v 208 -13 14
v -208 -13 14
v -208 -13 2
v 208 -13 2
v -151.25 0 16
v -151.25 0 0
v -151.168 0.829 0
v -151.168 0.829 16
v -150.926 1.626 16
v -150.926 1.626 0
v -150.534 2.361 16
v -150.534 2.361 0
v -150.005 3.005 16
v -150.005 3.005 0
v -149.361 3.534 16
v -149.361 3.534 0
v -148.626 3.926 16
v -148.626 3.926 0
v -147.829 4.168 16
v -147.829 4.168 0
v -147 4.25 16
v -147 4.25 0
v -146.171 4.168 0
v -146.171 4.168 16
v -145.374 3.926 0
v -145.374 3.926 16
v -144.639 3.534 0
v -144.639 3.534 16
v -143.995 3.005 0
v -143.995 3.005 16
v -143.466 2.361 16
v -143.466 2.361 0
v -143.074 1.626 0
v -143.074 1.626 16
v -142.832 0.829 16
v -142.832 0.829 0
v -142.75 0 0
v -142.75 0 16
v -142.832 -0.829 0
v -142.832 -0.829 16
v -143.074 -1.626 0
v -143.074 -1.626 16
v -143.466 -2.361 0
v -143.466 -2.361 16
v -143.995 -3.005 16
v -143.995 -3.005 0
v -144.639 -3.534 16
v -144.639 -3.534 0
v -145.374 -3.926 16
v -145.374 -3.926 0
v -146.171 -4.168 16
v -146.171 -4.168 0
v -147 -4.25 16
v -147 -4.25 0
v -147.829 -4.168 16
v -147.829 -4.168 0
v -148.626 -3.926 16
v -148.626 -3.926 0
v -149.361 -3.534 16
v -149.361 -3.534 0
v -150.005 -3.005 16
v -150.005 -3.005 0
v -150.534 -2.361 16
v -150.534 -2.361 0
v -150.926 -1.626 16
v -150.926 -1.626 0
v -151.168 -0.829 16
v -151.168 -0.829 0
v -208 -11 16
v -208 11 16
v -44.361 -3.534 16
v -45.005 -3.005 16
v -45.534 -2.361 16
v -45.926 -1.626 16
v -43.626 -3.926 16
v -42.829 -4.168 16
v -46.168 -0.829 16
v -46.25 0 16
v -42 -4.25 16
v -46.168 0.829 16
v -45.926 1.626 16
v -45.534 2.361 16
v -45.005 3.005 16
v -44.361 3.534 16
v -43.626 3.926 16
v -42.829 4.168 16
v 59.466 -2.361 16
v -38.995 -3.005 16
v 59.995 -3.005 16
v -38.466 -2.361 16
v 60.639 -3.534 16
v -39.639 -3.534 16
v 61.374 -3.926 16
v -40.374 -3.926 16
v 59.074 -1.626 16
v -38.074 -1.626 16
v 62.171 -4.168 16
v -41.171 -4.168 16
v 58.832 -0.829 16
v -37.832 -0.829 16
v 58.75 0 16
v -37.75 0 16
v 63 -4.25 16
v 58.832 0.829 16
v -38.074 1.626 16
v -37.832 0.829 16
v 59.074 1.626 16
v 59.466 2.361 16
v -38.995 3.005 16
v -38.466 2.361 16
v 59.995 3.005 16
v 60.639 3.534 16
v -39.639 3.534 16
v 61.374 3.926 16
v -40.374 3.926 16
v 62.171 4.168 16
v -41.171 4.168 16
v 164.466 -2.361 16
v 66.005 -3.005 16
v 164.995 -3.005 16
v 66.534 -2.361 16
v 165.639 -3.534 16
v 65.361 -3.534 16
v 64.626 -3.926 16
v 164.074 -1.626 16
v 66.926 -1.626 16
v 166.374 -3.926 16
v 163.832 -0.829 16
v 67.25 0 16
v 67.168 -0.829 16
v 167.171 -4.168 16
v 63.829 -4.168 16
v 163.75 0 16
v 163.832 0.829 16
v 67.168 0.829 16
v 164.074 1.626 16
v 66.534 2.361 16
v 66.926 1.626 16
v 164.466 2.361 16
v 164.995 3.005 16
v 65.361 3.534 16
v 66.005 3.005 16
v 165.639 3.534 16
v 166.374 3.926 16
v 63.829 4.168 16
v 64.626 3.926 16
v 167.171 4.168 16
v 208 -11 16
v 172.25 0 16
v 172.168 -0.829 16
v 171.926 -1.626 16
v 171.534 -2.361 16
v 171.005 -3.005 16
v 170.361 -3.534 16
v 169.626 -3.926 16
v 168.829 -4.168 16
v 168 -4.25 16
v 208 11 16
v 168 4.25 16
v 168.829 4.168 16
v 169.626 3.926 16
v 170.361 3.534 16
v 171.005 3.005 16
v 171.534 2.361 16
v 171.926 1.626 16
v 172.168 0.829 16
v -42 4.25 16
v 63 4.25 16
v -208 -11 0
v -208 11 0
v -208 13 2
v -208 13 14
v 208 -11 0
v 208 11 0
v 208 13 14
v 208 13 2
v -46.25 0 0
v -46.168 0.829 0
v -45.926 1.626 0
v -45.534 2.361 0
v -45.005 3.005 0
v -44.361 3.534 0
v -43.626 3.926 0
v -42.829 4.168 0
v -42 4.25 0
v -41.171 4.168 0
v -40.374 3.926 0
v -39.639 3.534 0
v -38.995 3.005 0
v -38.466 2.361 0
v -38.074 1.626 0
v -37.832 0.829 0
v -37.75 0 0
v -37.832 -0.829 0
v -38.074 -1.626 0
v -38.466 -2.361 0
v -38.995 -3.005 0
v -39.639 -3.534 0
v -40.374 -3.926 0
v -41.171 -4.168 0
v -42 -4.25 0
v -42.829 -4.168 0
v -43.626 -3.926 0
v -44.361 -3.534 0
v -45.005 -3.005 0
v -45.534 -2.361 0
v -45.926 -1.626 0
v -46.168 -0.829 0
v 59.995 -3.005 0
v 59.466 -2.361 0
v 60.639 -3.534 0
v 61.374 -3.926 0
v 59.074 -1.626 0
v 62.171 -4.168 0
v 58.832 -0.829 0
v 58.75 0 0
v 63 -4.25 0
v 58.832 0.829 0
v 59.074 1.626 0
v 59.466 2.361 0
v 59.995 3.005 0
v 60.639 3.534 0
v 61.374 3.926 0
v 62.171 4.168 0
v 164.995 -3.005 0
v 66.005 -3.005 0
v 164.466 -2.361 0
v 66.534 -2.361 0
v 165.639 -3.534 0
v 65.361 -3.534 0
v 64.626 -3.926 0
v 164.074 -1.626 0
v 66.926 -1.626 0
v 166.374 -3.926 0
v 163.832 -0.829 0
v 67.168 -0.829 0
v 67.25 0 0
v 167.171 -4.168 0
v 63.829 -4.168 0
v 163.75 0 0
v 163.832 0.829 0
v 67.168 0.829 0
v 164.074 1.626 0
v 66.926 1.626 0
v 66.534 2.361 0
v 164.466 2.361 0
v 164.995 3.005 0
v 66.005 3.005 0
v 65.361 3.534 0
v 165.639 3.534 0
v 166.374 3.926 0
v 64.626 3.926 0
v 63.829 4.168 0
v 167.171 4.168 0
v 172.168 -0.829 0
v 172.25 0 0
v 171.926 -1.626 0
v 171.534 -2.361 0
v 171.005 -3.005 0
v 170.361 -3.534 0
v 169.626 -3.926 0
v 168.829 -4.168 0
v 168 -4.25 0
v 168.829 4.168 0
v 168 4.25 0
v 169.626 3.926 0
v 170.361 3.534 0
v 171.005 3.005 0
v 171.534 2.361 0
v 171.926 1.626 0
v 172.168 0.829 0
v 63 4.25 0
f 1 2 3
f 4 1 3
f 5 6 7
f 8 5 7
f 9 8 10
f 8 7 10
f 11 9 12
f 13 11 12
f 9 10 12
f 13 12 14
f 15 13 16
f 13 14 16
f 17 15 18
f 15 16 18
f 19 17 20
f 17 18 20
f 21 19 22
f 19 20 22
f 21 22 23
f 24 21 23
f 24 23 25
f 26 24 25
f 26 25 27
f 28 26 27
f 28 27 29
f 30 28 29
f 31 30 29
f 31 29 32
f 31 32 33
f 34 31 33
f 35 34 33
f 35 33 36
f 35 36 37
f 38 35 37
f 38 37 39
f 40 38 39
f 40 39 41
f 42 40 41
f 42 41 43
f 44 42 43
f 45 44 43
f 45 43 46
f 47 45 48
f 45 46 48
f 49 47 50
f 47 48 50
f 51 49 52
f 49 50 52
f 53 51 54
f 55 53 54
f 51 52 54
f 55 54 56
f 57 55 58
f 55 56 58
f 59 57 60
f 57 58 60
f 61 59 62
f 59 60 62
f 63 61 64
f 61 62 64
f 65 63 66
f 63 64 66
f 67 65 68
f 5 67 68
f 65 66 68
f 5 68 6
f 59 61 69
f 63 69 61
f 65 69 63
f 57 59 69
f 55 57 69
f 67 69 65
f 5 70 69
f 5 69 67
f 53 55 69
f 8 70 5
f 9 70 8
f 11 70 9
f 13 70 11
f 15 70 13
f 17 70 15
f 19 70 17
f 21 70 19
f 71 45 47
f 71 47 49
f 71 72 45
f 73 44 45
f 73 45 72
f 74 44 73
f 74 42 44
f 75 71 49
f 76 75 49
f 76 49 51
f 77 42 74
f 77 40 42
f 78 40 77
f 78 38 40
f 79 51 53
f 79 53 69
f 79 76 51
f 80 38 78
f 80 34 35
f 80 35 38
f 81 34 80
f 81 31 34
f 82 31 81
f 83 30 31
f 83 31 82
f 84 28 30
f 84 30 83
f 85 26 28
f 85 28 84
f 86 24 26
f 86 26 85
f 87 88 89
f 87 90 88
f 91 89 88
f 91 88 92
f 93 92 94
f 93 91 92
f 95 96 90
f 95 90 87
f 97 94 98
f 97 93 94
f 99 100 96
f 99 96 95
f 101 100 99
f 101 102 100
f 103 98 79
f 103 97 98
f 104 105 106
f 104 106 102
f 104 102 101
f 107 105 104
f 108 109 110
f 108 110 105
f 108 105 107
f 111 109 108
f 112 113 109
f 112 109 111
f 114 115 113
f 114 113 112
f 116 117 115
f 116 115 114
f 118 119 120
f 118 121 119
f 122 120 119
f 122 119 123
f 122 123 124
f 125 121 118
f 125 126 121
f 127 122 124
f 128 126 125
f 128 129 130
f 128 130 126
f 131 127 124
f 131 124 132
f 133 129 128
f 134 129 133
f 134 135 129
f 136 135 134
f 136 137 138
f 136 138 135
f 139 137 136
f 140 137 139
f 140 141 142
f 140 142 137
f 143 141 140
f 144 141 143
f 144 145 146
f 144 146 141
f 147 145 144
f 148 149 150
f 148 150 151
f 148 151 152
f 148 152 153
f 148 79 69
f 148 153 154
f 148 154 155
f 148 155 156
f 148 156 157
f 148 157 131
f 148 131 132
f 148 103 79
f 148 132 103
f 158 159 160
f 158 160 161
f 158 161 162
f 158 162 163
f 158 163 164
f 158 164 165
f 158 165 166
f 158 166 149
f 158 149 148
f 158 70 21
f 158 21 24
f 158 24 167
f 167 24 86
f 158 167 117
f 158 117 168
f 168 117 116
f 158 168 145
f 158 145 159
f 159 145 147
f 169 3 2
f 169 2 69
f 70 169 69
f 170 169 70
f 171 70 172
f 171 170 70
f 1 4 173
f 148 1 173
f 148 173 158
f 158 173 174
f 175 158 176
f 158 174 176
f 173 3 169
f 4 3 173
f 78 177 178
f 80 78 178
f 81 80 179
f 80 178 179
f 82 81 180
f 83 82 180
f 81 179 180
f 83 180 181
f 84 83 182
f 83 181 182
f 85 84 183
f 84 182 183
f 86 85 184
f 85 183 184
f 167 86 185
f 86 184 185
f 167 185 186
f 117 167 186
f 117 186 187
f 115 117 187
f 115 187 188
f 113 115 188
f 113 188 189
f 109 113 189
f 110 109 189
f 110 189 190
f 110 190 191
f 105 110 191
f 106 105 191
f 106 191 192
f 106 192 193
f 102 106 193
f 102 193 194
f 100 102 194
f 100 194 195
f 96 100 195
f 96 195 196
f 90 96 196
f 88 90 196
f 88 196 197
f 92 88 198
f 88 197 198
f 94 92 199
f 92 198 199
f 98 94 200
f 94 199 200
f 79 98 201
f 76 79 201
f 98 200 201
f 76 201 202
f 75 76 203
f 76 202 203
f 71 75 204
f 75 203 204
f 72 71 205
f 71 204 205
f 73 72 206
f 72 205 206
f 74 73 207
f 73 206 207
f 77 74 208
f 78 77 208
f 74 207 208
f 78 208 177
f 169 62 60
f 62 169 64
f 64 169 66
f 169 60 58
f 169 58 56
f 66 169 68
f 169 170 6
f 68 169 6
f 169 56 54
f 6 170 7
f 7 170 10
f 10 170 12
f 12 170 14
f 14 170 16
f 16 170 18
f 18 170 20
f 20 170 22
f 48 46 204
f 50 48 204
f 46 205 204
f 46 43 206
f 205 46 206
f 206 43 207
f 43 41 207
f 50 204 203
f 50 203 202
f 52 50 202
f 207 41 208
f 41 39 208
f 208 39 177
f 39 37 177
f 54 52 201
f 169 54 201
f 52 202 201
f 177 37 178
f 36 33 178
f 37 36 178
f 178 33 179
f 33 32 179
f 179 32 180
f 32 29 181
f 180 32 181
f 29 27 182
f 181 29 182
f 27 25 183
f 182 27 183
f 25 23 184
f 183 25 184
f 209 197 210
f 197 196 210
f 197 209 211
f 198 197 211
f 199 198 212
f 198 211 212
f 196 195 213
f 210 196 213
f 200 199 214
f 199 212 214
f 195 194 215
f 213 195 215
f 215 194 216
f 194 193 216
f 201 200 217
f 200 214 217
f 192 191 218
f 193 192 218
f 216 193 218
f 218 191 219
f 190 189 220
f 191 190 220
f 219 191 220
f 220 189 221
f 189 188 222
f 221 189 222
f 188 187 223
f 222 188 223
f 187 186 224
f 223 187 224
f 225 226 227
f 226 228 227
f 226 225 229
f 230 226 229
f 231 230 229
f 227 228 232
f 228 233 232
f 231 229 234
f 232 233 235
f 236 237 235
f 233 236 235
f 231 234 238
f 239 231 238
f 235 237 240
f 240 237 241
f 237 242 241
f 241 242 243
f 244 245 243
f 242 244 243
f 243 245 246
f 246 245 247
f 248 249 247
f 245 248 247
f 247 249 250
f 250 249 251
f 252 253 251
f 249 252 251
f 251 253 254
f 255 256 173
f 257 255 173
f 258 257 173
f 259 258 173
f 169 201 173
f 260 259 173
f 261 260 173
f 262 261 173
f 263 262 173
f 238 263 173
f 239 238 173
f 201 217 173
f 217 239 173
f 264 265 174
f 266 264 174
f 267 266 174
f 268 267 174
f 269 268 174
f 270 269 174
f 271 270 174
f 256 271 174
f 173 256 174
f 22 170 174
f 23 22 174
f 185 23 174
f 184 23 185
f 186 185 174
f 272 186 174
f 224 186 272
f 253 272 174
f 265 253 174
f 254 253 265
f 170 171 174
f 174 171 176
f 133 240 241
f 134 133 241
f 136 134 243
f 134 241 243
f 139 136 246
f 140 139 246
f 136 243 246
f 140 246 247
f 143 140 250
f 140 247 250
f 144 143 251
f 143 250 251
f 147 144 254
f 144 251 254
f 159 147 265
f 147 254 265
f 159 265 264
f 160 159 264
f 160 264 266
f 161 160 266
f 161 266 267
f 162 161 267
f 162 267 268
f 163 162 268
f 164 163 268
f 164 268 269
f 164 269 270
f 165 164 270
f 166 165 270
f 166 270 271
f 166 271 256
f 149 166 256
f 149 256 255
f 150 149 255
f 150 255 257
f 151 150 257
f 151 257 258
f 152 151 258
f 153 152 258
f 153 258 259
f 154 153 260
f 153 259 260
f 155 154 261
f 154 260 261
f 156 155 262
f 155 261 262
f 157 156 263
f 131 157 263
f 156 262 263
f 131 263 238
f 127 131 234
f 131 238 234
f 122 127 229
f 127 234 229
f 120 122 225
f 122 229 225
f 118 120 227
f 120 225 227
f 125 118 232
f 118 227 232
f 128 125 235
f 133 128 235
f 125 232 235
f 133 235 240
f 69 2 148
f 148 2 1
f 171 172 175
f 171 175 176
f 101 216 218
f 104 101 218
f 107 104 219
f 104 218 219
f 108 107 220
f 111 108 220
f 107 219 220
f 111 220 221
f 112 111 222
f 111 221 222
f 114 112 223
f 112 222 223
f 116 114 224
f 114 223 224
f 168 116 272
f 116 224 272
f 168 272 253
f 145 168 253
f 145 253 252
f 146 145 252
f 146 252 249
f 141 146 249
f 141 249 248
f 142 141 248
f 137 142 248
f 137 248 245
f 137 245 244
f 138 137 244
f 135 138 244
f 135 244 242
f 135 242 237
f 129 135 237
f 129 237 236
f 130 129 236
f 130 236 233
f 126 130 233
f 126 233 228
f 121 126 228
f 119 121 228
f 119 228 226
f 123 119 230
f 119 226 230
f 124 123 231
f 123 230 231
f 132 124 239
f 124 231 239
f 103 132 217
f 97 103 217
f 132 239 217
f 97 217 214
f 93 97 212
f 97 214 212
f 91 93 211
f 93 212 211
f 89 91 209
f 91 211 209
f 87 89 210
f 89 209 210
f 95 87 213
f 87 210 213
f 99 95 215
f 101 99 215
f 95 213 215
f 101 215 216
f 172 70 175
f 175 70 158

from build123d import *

# Parameters (mm, degrees)
SKETCH_1_W          = 416
SKETCH_1_H          = 28
EXTRUDE_677_DEPTH   = 16
FILLET_1_R          = 0.8
CUT_EXTRUDE_1_DEPTH = 417.542914956
CHAMFER_1_SIZE      = 2
HOLE_WIZARD_M10_1_D = 8.5


with BuildPart() as part:
    # 草图1 → Extrude 677 (new body)
    with BuildSketch(Plane.XY):
        Rectangle(SKETCH_1_W, SKETCH_1_H)
    extrude(amount=EXTRUDE_677_DEPTH)

    # 圆角1
    fillet_1_edges = [part.edges().sort_by_distance(p)[0] for p in [
        (0, -14, 16),
        (0, -14, 0),
        (0, 14, 0),
        (0, 14, 16),
    ]]
    fillet(fillet_1_edges, radius=FILLET_1_R)

    # 草图2 → 切除-拉伸1 (cut, through all)
    with BuildSketch(Plane.ZY.offset(208)):
        with BuildLine():
            Line((16, 13), (0, 13))
            Line((0, 13), (0, 13.2))
            ThreePointArc((0, 13.2), (0.234314575, 13.765685425), (0.8, 14))
            Line((0.8, 14), (15.2, 14))
            ThreePointArc((15.2, 14), (15.765685425, 13.765685425), (16, 13.2))
            Line((16, 13.2), (16, 13))
        make_face()
        with BuildLine():
            Line((16, -13), (0, -13))
            Line((0, -13), (0, -13.2))
            ThreePointArc((0, -13.2), (0.234314575, -13.765685425), (0.8, -14))
            Line((0.8, -14), (15.2, -14))
            ThreePointArc((15.2, -14), (15.765685425, -13.765685425), (16, -13.2))
            Line((16, -13.2), (16, -13))
        make_face()
    extrude(amount=-CUT_EXTRUDE_1_DEPTH, mode=Mode.SUBTRACT)

    # 倒角1
    chamfer_1_edges = [part.edges().sort_by_distance(p)[0] for p in [
        (0, 13, 16),
        (0, 13, 0),
        (0, -13, 16),
        (0, -13, 0),
    ]]
    chamfer(chamfer_1_edges, length=CHAMFER_1_SIZE)

    # M10 螺纹孔1 (through all)
    with Locations(Plane.XY.offset(16)):
        with Locations((-147, 0), (-42, 0), (63, 0), (168, 0)):
            Hole(HOLE_WIZARD_M10_1_D / 2)


solid = part.part
